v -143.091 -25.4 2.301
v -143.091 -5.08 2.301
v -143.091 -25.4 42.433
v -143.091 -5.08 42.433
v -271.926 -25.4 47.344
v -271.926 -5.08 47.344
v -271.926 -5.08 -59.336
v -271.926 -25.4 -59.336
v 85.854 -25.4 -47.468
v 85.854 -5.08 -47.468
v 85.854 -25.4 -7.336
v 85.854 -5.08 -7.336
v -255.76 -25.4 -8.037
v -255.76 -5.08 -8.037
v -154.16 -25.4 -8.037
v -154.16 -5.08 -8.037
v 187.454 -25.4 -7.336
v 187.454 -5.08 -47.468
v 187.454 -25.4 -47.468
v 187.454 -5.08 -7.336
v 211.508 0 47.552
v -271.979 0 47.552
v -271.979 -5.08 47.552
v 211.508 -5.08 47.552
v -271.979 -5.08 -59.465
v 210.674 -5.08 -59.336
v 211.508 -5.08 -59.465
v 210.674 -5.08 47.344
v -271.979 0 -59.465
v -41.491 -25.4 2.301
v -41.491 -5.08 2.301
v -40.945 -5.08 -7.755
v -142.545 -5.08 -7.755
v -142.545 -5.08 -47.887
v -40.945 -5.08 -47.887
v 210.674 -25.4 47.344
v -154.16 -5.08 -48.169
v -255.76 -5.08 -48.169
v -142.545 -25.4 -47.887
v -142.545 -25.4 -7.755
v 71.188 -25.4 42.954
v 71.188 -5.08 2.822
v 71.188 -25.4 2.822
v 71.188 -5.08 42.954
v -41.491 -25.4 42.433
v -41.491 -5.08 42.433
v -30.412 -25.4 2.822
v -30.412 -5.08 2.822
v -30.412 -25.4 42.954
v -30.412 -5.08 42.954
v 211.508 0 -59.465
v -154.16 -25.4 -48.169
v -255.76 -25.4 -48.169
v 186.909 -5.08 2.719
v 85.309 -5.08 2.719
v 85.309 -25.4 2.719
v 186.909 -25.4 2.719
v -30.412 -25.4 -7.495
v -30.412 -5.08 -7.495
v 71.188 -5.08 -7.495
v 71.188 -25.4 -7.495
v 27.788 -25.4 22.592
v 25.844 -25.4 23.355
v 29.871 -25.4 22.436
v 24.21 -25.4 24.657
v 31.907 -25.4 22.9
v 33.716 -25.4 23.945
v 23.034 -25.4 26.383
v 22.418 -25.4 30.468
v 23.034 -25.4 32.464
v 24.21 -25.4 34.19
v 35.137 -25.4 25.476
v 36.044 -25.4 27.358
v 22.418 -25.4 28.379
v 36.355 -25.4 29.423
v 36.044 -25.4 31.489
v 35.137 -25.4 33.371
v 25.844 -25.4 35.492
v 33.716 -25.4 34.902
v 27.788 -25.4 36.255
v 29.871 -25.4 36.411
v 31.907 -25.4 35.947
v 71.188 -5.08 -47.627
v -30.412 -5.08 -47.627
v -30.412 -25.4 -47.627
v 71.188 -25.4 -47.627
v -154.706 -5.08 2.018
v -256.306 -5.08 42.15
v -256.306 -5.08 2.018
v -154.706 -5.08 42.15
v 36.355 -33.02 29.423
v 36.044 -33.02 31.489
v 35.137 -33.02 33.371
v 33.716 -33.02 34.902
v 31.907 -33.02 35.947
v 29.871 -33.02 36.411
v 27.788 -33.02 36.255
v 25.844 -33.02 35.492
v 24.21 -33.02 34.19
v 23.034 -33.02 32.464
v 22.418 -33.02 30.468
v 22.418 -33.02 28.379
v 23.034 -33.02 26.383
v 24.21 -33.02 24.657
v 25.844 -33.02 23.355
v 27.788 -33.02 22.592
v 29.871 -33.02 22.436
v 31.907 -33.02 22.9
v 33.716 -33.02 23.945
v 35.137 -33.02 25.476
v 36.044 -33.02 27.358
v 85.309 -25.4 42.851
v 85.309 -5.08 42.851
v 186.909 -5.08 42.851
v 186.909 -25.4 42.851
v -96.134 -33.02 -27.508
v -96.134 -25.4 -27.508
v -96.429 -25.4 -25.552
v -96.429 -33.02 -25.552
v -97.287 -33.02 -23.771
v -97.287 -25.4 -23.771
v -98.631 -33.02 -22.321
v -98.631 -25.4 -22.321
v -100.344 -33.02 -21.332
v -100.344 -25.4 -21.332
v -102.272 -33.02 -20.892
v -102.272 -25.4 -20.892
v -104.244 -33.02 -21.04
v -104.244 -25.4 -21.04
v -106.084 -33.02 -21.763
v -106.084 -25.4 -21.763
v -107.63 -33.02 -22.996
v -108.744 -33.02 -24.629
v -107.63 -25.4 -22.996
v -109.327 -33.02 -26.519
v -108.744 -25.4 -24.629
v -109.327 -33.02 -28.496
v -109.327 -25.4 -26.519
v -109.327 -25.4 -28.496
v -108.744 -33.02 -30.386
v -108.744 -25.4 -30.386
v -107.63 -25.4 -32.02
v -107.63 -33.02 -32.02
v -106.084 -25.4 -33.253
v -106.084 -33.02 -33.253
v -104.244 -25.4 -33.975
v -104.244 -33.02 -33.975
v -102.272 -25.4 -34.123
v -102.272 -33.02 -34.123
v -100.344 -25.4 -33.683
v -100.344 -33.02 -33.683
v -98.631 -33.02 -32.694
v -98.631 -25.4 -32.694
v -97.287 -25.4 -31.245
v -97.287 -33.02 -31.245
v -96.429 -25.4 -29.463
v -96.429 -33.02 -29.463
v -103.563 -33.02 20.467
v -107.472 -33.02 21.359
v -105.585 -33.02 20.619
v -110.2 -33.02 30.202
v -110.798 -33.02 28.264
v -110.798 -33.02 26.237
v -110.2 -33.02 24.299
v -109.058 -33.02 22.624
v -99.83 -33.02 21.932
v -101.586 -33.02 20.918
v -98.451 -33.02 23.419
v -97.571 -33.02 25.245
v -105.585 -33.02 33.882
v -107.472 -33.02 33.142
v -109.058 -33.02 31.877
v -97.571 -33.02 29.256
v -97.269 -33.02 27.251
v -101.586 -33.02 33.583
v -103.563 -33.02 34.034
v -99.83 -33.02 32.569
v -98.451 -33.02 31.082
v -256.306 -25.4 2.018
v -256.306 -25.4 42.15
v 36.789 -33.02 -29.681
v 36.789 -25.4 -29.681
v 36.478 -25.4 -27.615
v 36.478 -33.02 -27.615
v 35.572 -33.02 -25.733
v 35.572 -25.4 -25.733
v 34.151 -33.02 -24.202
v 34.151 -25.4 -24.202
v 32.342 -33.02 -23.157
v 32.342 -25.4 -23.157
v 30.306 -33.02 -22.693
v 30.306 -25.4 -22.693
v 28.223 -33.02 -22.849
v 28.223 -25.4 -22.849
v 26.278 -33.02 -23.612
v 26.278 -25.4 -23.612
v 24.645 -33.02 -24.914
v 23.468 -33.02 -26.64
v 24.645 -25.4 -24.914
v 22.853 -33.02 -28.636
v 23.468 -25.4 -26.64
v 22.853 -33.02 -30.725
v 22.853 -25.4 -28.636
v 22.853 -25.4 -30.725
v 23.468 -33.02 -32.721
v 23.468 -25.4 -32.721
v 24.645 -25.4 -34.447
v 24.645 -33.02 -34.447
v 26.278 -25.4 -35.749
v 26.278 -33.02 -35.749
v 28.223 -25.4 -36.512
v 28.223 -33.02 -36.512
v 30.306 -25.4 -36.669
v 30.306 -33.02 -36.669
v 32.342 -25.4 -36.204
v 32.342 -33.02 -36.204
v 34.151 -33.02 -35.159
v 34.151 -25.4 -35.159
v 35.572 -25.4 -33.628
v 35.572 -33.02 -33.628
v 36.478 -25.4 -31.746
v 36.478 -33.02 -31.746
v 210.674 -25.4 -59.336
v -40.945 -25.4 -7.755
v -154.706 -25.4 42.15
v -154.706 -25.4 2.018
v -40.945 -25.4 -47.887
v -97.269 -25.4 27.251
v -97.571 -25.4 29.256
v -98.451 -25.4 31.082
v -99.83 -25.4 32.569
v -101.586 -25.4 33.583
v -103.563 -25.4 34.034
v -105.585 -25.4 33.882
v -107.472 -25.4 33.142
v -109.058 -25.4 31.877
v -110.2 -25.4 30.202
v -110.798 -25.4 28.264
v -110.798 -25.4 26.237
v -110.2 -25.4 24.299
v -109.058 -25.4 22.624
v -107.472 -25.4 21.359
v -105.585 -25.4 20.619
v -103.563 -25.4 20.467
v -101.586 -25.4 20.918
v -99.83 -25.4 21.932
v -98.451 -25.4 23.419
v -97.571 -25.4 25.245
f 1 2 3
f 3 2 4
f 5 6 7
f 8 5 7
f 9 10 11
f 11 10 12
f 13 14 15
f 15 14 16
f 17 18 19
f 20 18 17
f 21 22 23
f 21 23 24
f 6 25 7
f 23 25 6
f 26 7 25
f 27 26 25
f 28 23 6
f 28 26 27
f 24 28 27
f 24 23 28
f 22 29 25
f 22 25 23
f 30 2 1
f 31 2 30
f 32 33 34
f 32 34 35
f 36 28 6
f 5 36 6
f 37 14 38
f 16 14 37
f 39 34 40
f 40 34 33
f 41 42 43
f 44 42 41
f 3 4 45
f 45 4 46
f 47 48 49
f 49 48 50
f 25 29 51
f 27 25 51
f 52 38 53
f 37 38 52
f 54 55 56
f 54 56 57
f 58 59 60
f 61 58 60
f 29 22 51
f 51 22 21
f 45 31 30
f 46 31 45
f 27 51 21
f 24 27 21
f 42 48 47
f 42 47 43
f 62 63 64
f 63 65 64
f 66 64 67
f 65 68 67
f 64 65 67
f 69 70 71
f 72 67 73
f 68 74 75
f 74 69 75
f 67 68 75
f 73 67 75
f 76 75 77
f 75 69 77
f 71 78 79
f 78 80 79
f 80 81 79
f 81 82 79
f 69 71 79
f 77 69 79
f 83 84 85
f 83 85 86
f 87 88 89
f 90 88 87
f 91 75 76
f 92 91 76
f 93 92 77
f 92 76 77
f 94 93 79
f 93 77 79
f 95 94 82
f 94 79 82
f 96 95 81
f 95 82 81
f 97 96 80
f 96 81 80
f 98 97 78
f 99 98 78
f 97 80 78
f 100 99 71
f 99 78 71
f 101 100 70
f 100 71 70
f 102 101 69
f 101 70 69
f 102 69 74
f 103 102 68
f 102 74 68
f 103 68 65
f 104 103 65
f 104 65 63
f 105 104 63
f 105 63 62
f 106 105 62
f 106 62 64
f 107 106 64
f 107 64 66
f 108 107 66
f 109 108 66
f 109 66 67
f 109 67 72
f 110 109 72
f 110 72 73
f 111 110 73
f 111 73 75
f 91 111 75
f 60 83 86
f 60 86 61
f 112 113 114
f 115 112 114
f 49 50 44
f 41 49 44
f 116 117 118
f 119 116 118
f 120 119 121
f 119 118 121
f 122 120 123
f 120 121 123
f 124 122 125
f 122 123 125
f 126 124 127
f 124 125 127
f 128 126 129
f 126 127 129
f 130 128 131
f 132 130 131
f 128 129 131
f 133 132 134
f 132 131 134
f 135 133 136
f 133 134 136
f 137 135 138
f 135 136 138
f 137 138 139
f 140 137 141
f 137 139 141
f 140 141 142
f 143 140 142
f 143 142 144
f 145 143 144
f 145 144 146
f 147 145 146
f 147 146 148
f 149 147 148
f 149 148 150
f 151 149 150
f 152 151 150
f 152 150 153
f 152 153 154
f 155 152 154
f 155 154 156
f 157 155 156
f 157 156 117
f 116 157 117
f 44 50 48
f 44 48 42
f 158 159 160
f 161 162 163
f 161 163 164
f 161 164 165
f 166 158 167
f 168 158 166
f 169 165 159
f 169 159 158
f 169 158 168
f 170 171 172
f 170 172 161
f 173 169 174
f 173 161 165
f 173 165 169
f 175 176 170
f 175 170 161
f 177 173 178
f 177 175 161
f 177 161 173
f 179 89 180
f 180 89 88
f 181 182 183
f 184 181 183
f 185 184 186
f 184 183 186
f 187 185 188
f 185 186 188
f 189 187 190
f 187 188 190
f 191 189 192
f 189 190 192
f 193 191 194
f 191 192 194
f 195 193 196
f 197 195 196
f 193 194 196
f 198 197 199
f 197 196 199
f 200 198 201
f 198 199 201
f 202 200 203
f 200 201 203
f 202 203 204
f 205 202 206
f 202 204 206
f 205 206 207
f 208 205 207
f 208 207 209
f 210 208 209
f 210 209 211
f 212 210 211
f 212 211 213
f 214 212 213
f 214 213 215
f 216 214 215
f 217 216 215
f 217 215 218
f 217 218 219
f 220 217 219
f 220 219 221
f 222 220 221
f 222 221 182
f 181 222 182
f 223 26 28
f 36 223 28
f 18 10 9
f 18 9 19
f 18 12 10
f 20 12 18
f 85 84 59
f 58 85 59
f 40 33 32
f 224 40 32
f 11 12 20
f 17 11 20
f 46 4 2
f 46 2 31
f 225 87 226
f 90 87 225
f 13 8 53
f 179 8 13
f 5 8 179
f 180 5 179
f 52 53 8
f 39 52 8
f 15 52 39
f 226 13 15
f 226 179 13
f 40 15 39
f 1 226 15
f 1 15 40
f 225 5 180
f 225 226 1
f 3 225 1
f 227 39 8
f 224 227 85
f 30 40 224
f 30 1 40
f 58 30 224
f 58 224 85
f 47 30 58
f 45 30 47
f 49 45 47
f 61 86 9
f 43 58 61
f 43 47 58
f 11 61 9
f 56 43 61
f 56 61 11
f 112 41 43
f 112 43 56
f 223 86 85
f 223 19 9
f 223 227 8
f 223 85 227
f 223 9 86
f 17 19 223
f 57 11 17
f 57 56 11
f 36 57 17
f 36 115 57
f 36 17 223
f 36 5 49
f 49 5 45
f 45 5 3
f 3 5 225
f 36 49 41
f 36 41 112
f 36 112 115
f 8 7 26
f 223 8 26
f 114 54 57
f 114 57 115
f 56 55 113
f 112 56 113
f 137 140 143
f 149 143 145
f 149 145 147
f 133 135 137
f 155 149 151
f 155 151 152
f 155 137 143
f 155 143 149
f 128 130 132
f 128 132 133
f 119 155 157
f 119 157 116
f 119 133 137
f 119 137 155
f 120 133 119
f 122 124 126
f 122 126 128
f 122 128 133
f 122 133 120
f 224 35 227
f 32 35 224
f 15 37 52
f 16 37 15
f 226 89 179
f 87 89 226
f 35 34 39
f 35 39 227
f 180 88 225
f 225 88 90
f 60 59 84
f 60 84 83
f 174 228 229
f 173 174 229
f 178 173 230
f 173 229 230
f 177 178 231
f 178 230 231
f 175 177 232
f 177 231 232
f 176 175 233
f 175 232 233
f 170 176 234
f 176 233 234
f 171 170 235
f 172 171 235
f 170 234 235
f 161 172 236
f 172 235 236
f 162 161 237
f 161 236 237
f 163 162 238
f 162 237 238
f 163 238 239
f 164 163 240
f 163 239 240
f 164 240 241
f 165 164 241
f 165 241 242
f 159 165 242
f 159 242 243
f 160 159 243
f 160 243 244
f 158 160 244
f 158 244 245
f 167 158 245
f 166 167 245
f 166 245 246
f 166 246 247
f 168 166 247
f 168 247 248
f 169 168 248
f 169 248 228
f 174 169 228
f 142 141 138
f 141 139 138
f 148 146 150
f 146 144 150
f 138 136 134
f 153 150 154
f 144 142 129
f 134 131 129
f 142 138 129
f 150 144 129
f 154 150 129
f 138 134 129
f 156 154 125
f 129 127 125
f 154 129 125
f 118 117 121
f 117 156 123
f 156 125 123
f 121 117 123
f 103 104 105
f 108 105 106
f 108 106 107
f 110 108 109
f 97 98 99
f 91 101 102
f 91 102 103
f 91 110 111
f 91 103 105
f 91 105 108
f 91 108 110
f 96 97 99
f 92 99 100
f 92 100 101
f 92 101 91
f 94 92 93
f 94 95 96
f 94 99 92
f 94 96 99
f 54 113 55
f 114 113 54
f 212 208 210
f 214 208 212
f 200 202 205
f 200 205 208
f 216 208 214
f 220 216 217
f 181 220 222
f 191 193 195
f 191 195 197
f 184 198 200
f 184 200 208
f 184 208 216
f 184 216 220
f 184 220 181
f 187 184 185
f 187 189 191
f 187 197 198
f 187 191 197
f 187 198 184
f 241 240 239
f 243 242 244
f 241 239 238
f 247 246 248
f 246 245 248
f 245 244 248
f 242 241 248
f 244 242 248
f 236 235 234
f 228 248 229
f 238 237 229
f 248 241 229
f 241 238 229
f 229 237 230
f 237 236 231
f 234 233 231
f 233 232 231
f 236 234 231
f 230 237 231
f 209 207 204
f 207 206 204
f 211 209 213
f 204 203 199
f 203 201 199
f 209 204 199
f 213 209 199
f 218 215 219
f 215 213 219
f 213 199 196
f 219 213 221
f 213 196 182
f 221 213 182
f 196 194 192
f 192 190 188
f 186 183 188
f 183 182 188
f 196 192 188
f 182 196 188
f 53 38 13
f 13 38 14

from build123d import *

# Parameters (mm, degrees)
F0_W     = 120.65
F0_H     = 35.56
F1_DEPTH = 25.4
F3_D     = 25.4
F4_R     = 6.8023832056
F5_DEPTH = 33.02
F4_R_2   = 6.6337025735
F4_R_3   = 7.0075257305
F4_R_4   = 7.0075264236
F6_W     = 101.6
F6_H     = 40.132
F7_DEPTH = 25.4
F8_W     = 483.4869205952
F8_H     = 107.0168726146
F9_DEPTH = 5.08


with BuildPart() as f1:
    # F0 (on Front) → F1 (new body)
    with BuildSketch(Plane.XZ):
        with Locations((-211.6008736181, 29.5644977273)):
            Rectangle(F0_W, F0_H)
        with Locations((150.3491263819, 29.5644977273)):
            Rectangle(F0_W, F0_H)
        Polygon((-30.6258736181, 47.3444977273), (-151.2758736181, 47.3444977273), (-151.2758736181, 11.7844977273), (-151.0068327188, 11.7844977273), (-30.6258736181, 11.7844977273), align=None)
        Polygon((-151.2758736181, 11.7844977273), (-271.9258736181, 11.7844977273), (-271.9258736181, -23.7755022727), (-151.4414250851, -23.7755022727), (-151.2758736181, -23.7755022727), align=None)
        with Locations((29.6991263819, 29.5644977273)):
            Rectangle(F0_W, F0_H)
        Polygon((-151.4414250851, -23.7755022727), (-271.9258736181, -23.7755022727), (-271.9258736181, -59.3355022727), (-151.2758736181, -59.3355022727), (-151.2758736181, -23.7755022727), align=None)
        Polygon((210.6741263819, 11.7844977273), (90.0241263819, 11.7844977273), (90.0241263819, -23.7755022727), (90.0241263819, -59.3355022727), (210.6741263819, -59.3355022727), align=None)
        Polygon((89.7550880909, -23.7755022727), (-30.6258736181, -23.7755022727), (-30.6258736181, -59.3355022727), (90.0241263819, -59.3355022727), (90.0241263819, -23.7755022727), align=None)
        Polygon((-30.6388696337, -23.7755022727), (-151.2758736181, -23.7755022727), (-151.2758736181, -59.3355022727), (-30.6258736181, -59.3355022727), (-30.6258736181, -23.7755022727), align=None)
        Polygon((-151.0068327188, 11.7844977273), (-151.2758736181, 11.7844977273), (-151.2758736181, -23.7755022727), (-30.6388696337, -23.7755022727), (-30.6258736181, 11.7844977273), align=None)
        Polygon((90.0241263819, 11.7844977273), (-30.6258736181, 11.7844977273), (-30.6258736181, -23.7755022727), (89.7550880909, -23.7755022727), (90.0241263819, -23.7755022727), align=None)
        Polygon((-30.6258736181, -23.7755022727), (-30.6258736181, 11.7844977273), (-30.6388696337, -23.7755022727), align=None)
    extrude(amount=F1_DEPTH)

    # F3 (through all)
    with Locations(Plane(origin=(0, 0, 0), x_dir=(1, 0, 0), z_dir=(0, 1, 0))):
        with Locations((-103.6367118359, -26.6269370914), (-103.2021194696, 27.6966020465), (28.912730515, -29.2344670743), (28.912730515, 29.8695452511)):
            Hole(F3_D / 2)


with BuildPart() as f5:
    # F4 (on Front) → F5 (new body)
    with BuildSketch(Plane.XZ):
        with Locations((-104.0713042021, 27.2505022585)):
            Circle(F4_R)
    extrude(amount=F5_DEPTH)


with BuildPart() as f5b:
    # F4 (on Front) → F5, piece 2 (new body)
    with BuildSketch(Plane.XZ):
        with Locations((-102.767534554, -27.5076255202)):
            Circle(F4_R_2)
    extrude(amount=F5_DEPTH)


with BuildPart() as f5c:
    # F4 (on Front) → F5, piece 3 (new body)
    with BuildSketch(Plane.XZ):
        with Locations((29.3473172933, 29.4234454632)):
            Circle(F4_R_3)
    extrude(amount=F5_DEPTH)


with BuildPart() as f5d:
    # F4 (on Front) → F5, piece 4 (new body)
    with BuildSketch(Plane.XZ):
        with Locations((29.7819040716, -29.6805687249)):
            Circle(F4_R_4)
    extrude(amount=F5_DEPTH)


with BuildPart() as f7_tool:
    # F6 (on Front) → F7 (new body)
    with BuildSketch(Plane.XZ):
        with Locations((-92.2905808866, 22.3666099455)):
            Rectangle(F6_W, F6_H)
        with Locations((-91.7451425076, -27.8205318)):
            Rectangle(F6_W, F6_H)
        with Locations((20.3878538132, 22.8883219507)):
            Rectangle(F6_W, F6_H)
        with Locations((20.3878538132, -27.5612100404)):
            Rectangle(F6_W, F6_H)
        with Locations((136.1087430269, 22.7851342034)):
            Rectangle(F6_W, F6_H)
        with Locations((136.6541814059, -27.4020075422)):
            Rectangle(F6_W, F6_H)
        with Locations((-205.5057566613, 22.0837430652)):
            Rectangle(F6_W, F6_H)
        with Locations((-204.9603182822, -28.1033986803)):
            Rectangle(F6_W, F6_H)
    extrude(amount=F7_DEPTH)


with BuildPart() as f1_1:
    add(f1.part)

    # F7: cut by f7_tool
    add(f7_tool.part, mode=Mode.SUBTRACT)

    # F8 (on Front) → F9 (join)
    with BuildSketch(Plane.XZ):
        with Locations((-30.2356928587, -5.956241861)):
            Rectangle(F8_W, F8_H)
    extrude(amount=F9_DEPTH)


with BuildPart() as f5_1:
    add(f5.part)

    # F7: cut by f7_tool
    add(f7_tool.part, mode=Mode.SUBTRACT)


with BuildPart() as f5b_1:
    add(f5b.part)

    # F7: cut by f7_tool
    add(f7_tool.part, mode=Mode.SUBTRACT)


with BuildPart() as f5c_1:
    add(f5c.part)

    # F7: cut by f7_tool
    add(f7_tool.part, mode=Mode.SUBTRACT)


with BuildPart() as f5d_1:
    add(f5d.part)

    # F7: cut by f7_tool
    add(f7_tool.part, mode=Mode.SUBTRACT)


solid = Compound([f1_1.part, f5_1.part, f5b_1.part, f5c_1.part, f5d_1.part])
